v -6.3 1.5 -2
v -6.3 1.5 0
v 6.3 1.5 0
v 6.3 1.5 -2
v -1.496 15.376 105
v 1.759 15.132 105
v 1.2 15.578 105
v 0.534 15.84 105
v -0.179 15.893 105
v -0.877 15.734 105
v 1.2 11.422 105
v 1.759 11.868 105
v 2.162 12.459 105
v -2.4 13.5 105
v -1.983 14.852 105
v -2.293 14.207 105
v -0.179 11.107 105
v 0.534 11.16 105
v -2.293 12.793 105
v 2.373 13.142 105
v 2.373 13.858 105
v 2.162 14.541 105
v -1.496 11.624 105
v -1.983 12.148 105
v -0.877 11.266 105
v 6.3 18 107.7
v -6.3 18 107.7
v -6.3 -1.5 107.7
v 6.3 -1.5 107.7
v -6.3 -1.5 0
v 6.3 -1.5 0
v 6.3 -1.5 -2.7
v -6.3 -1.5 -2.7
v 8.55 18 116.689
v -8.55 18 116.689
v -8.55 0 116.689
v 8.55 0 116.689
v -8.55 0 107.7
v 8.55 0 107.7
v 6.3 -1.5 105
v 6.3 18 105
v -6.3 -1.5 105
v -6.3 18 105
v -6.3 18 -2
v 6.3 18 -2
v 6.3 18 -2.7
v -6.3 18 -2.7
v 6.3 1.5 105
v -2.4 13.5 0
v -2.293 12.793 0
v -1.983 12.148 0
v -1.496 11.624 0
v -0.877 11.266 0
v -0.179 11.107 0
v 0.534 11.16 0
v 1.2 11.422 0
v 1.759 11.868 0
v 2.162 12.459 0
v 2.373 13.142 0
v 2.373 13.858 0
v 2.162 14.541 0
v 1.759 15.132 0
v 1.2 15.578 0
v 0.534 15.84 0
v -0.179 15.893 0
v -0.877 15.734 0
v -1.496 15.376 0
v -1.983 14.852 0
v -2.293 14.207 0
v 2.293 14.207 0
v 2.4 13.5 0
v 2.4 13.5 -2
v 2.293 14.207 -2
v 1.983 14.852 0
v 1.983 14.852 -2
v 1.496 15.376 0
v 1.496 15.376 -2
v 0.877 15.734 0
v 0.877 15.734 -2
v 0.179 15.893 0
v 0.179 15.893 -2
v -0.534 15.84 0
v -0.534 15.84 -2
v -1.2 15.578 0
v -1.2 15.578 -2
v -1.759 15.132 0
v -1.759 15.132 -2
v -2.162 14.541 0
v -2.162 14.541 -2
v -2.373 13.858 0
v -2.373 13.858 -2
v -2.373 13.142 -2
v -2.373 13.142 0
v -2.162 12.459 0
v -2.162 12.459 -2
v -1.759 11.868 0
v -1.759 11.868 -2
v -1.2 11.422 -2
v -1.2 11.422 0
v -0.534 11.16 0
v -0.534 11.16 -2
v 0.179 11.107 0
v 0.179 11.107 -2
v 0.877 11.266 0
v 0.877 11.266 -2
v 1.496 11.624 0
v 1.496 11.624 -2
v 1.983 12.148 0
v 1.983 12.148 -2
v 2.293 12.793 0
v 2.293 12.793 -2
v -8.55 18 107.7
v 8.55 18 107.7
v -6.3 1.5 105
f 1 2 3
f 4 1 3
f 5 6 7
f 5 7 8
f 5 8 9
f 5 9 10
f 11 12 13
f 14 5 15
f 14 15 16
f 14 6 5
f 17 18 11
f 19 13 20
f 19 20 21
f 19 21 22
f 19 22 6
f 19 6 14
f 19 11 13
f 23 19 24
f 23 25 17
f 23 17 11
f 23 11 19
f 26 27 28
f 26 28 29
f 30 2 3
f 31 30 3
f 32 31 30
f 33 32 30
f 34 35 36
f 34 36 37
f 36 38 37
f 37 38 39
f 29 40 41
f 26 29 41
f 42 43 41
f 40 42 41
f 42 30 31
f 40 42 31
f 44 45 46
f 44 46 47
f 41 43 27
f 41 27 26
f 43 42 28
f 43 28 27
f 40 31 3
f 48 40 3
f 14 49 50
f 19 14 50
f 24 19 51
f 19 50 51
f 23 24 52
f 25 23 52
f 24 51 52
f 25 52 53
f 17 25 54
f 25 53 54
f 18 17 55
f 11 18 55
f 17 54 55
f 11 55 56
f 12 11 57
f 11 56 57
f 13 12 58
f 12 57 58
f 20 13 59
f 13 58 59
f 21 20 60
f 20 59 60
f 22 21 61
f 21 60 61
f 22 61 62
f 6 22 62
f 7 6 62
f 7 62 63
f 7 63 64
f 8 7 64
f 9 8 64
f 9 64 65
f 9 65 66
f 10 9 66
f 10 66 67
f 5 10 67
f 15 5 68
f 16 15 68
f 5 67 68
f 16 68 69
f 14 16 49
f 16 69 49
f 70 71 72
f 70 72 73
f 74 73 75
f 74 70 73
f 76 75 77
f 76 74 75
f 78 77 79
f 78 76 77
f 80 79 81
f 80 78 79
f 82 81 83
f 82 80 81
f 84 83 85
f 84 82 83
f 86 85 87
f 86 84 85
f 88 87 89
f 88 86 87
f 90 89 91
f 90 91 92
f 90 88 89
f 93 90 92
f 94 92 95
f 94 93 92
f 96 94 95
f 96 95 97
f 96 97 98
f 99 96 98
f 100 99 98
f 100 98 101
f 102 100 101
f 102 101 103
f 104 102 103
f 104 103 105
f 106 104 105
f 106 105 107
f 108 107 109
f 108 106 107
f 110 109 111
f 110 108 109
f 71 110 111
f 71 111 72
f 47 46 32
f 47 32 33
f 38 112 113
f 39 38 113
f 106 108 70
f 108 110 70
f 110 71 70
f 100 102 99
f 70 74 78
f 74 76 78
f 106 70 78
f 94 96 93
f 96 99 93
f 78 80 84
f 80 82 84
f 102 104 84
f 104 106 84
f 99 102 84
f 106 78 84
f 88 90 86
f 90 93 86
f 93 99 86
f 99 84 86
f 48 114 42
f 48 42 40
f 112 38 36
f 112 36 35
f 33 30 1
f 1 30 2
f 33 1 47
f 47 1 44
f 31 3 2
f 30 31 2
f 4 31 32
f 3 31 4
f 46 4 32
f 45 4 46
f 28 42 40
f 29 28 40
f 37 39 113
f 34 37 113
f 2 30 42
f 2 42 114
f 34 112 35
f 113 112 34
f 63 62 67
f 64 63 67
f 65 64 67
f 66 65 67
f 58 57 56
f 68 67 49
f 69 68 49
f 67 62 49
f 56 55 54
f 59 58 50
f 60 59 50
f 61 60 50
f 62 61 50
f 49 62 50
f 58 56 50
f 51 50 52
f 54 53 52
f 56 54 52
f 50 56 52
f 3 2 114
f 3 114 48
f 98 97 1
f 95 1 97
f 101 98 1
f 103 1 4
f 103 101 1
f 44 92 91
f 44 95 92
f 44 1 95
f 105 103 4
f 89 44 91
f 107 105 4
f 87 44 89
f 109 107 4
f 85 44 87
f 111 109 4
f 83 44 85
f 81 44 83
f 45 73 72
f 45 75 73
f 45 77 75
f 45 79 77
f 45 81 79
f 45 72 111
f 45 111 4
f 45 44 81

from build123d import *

# Parameters (mm, degrees)
SKETCH_1_W          = 42
SKETCH_1_H          = 10
EXTRUDE_1_DEPTH     = 350
SKETCH_2_W          = 42
SKETCH_2_H          = 65
EXTRUDE_2_DEPTH     = 9
SKETCH_3_W          = 42
SKETCH_3_H          = 65
EXTRUDE_3_DEPTH     = 9
SKETCH_4_R          = 8
EXTRUDE_4_DEPTH     = 350
SKETCH_5_W          = 57
SKETCH_5_H          = 60
EXTRUDE_5_DEPTH     = 56
SCALE_1_SCALE       = 0.3
SKETCH_6_W          = 12.6
SKETCH_6_H          = 16.5
SKETCH_6_R          = 2.4
CUT_EXTRUDE_1_DEPTH = 2
SKETCH_7_W          = 42.471504896
SKETCH_7_H          = 16.55668835
CUT_EXTRUDE_2_DEPTH = 30


with BuildPart() as part:
    # 草图1 → 凸台-拉伸1 (new body)
    with BuildSketch(Plane.XY):
        Rectangle(SKETCH_1_W, SKETCH_1_H)
    extrude(amount=EXTRUDE_1_DEPTH)


with BuildPart() as body_2:
    # 草图2 → 凸台-拉伸2 (new body)
    with BuildSketch(Plane(origin=(0, 0, 0), x_dir=(-1, 0, 0), z_dir=(0, 0, -1))):
        with Locations((0, 27.5)):
            Rectangle(SKETCH_2_W, SKETCH_2_H)
    extrude(amount=EXTRUDE_2_DEPTH)


with BuildPart() as body_3:
    # 草图3 → 凸台-拉伸3 (new body)
    with BuildSketch(Plane.XY.offset(350)):
        with Locations((0, 27.5)):
            Rectangle(SKETCH_3_W, SKETCH_3_H)
    extrude(amount=EXTRUDE_3_DEPTH)


with BuildPart() as body_4:
    # 草图4 → 凸台-拉伸4 (new body)
    with BuildSketch(Plane.XY):
        with Locations(Location((0, 45, 0), (0, 0, 180))):
            Circle(SKETCH_4_R)
    extrude(amount=EXTRUDE_4_DEPTH)


with BuildPart() as body_5:
    # 草图5 → 凸台-拉伸5 (new body)
    with BuildSketch(Plane.XY.offset(359)):
        with Locations((0, 30)):
            Rectangle(SKETCH_5_W, SKETCH_5_H)
    extrude(amount=EXTRUDE_5_DEPTH)


with BuildPart() as part_1:
    # 缩放比例1: scaled about (0, 0, 0)
    add(part.part.scale(SCALE_1_SCALE))


with BuildPart() as body_4_1:
    # 缩放比例1: scaled about (0, 0, 0)
    add(body_4.part.scale(SCALE_1_SCALE))


with BuildPart() as body_5_1:
    # 缩放比例1: scaled about (0, 0, 0)
    add(body_5.part.scale(SCALE_1_SCALE))

    # 草图7 → 切除-拉伸2 (cut)
    with BuildSketch(Plane(origin=(0, 18, 0), x_dir=(1, 0, 0), z_dir=(0, 1, 0))):
        with Locations((2.069586044, -124.967185352)):
            Rectangle(SKETCH_7_W, SKETCH_7_H)
    extrude(amount=-CUT_EXTRUDE_2_DEPTH, mode=Mode.SUBTRACT)


with BuildPart() as body_2_1:
    # 缩放比例1: scaled about (0, 0, 0)
    add(body_2.part.scale(SCALE_1_SCALE))

    # 草图6 → 切除-拉伸1 (cut)
    with BuildSketch(Plane.XY):
        with Locations((0, 9.75)):
            Rectangle(SKETCH_6_W, SKETCH_6_H)
        with Locations((0, 13.5)):
            Circle(SKETCH_6_R, mode=Mode.SUBTRACT)
    extrude(amount=-CUT_EXTRUDE_1_DEPTH, mode=Mode.SUBTRACT)


with BuildPart() as body_3_1:
    # 缩放比例1: scaled about (0, 0, 0)
    add(body_3.part.scale(SCALE_1_SCALE))


solid = Compound([part_1.part, body_4_1.part, body_5_1.part, body_2_1.part, body_3_1.part])
